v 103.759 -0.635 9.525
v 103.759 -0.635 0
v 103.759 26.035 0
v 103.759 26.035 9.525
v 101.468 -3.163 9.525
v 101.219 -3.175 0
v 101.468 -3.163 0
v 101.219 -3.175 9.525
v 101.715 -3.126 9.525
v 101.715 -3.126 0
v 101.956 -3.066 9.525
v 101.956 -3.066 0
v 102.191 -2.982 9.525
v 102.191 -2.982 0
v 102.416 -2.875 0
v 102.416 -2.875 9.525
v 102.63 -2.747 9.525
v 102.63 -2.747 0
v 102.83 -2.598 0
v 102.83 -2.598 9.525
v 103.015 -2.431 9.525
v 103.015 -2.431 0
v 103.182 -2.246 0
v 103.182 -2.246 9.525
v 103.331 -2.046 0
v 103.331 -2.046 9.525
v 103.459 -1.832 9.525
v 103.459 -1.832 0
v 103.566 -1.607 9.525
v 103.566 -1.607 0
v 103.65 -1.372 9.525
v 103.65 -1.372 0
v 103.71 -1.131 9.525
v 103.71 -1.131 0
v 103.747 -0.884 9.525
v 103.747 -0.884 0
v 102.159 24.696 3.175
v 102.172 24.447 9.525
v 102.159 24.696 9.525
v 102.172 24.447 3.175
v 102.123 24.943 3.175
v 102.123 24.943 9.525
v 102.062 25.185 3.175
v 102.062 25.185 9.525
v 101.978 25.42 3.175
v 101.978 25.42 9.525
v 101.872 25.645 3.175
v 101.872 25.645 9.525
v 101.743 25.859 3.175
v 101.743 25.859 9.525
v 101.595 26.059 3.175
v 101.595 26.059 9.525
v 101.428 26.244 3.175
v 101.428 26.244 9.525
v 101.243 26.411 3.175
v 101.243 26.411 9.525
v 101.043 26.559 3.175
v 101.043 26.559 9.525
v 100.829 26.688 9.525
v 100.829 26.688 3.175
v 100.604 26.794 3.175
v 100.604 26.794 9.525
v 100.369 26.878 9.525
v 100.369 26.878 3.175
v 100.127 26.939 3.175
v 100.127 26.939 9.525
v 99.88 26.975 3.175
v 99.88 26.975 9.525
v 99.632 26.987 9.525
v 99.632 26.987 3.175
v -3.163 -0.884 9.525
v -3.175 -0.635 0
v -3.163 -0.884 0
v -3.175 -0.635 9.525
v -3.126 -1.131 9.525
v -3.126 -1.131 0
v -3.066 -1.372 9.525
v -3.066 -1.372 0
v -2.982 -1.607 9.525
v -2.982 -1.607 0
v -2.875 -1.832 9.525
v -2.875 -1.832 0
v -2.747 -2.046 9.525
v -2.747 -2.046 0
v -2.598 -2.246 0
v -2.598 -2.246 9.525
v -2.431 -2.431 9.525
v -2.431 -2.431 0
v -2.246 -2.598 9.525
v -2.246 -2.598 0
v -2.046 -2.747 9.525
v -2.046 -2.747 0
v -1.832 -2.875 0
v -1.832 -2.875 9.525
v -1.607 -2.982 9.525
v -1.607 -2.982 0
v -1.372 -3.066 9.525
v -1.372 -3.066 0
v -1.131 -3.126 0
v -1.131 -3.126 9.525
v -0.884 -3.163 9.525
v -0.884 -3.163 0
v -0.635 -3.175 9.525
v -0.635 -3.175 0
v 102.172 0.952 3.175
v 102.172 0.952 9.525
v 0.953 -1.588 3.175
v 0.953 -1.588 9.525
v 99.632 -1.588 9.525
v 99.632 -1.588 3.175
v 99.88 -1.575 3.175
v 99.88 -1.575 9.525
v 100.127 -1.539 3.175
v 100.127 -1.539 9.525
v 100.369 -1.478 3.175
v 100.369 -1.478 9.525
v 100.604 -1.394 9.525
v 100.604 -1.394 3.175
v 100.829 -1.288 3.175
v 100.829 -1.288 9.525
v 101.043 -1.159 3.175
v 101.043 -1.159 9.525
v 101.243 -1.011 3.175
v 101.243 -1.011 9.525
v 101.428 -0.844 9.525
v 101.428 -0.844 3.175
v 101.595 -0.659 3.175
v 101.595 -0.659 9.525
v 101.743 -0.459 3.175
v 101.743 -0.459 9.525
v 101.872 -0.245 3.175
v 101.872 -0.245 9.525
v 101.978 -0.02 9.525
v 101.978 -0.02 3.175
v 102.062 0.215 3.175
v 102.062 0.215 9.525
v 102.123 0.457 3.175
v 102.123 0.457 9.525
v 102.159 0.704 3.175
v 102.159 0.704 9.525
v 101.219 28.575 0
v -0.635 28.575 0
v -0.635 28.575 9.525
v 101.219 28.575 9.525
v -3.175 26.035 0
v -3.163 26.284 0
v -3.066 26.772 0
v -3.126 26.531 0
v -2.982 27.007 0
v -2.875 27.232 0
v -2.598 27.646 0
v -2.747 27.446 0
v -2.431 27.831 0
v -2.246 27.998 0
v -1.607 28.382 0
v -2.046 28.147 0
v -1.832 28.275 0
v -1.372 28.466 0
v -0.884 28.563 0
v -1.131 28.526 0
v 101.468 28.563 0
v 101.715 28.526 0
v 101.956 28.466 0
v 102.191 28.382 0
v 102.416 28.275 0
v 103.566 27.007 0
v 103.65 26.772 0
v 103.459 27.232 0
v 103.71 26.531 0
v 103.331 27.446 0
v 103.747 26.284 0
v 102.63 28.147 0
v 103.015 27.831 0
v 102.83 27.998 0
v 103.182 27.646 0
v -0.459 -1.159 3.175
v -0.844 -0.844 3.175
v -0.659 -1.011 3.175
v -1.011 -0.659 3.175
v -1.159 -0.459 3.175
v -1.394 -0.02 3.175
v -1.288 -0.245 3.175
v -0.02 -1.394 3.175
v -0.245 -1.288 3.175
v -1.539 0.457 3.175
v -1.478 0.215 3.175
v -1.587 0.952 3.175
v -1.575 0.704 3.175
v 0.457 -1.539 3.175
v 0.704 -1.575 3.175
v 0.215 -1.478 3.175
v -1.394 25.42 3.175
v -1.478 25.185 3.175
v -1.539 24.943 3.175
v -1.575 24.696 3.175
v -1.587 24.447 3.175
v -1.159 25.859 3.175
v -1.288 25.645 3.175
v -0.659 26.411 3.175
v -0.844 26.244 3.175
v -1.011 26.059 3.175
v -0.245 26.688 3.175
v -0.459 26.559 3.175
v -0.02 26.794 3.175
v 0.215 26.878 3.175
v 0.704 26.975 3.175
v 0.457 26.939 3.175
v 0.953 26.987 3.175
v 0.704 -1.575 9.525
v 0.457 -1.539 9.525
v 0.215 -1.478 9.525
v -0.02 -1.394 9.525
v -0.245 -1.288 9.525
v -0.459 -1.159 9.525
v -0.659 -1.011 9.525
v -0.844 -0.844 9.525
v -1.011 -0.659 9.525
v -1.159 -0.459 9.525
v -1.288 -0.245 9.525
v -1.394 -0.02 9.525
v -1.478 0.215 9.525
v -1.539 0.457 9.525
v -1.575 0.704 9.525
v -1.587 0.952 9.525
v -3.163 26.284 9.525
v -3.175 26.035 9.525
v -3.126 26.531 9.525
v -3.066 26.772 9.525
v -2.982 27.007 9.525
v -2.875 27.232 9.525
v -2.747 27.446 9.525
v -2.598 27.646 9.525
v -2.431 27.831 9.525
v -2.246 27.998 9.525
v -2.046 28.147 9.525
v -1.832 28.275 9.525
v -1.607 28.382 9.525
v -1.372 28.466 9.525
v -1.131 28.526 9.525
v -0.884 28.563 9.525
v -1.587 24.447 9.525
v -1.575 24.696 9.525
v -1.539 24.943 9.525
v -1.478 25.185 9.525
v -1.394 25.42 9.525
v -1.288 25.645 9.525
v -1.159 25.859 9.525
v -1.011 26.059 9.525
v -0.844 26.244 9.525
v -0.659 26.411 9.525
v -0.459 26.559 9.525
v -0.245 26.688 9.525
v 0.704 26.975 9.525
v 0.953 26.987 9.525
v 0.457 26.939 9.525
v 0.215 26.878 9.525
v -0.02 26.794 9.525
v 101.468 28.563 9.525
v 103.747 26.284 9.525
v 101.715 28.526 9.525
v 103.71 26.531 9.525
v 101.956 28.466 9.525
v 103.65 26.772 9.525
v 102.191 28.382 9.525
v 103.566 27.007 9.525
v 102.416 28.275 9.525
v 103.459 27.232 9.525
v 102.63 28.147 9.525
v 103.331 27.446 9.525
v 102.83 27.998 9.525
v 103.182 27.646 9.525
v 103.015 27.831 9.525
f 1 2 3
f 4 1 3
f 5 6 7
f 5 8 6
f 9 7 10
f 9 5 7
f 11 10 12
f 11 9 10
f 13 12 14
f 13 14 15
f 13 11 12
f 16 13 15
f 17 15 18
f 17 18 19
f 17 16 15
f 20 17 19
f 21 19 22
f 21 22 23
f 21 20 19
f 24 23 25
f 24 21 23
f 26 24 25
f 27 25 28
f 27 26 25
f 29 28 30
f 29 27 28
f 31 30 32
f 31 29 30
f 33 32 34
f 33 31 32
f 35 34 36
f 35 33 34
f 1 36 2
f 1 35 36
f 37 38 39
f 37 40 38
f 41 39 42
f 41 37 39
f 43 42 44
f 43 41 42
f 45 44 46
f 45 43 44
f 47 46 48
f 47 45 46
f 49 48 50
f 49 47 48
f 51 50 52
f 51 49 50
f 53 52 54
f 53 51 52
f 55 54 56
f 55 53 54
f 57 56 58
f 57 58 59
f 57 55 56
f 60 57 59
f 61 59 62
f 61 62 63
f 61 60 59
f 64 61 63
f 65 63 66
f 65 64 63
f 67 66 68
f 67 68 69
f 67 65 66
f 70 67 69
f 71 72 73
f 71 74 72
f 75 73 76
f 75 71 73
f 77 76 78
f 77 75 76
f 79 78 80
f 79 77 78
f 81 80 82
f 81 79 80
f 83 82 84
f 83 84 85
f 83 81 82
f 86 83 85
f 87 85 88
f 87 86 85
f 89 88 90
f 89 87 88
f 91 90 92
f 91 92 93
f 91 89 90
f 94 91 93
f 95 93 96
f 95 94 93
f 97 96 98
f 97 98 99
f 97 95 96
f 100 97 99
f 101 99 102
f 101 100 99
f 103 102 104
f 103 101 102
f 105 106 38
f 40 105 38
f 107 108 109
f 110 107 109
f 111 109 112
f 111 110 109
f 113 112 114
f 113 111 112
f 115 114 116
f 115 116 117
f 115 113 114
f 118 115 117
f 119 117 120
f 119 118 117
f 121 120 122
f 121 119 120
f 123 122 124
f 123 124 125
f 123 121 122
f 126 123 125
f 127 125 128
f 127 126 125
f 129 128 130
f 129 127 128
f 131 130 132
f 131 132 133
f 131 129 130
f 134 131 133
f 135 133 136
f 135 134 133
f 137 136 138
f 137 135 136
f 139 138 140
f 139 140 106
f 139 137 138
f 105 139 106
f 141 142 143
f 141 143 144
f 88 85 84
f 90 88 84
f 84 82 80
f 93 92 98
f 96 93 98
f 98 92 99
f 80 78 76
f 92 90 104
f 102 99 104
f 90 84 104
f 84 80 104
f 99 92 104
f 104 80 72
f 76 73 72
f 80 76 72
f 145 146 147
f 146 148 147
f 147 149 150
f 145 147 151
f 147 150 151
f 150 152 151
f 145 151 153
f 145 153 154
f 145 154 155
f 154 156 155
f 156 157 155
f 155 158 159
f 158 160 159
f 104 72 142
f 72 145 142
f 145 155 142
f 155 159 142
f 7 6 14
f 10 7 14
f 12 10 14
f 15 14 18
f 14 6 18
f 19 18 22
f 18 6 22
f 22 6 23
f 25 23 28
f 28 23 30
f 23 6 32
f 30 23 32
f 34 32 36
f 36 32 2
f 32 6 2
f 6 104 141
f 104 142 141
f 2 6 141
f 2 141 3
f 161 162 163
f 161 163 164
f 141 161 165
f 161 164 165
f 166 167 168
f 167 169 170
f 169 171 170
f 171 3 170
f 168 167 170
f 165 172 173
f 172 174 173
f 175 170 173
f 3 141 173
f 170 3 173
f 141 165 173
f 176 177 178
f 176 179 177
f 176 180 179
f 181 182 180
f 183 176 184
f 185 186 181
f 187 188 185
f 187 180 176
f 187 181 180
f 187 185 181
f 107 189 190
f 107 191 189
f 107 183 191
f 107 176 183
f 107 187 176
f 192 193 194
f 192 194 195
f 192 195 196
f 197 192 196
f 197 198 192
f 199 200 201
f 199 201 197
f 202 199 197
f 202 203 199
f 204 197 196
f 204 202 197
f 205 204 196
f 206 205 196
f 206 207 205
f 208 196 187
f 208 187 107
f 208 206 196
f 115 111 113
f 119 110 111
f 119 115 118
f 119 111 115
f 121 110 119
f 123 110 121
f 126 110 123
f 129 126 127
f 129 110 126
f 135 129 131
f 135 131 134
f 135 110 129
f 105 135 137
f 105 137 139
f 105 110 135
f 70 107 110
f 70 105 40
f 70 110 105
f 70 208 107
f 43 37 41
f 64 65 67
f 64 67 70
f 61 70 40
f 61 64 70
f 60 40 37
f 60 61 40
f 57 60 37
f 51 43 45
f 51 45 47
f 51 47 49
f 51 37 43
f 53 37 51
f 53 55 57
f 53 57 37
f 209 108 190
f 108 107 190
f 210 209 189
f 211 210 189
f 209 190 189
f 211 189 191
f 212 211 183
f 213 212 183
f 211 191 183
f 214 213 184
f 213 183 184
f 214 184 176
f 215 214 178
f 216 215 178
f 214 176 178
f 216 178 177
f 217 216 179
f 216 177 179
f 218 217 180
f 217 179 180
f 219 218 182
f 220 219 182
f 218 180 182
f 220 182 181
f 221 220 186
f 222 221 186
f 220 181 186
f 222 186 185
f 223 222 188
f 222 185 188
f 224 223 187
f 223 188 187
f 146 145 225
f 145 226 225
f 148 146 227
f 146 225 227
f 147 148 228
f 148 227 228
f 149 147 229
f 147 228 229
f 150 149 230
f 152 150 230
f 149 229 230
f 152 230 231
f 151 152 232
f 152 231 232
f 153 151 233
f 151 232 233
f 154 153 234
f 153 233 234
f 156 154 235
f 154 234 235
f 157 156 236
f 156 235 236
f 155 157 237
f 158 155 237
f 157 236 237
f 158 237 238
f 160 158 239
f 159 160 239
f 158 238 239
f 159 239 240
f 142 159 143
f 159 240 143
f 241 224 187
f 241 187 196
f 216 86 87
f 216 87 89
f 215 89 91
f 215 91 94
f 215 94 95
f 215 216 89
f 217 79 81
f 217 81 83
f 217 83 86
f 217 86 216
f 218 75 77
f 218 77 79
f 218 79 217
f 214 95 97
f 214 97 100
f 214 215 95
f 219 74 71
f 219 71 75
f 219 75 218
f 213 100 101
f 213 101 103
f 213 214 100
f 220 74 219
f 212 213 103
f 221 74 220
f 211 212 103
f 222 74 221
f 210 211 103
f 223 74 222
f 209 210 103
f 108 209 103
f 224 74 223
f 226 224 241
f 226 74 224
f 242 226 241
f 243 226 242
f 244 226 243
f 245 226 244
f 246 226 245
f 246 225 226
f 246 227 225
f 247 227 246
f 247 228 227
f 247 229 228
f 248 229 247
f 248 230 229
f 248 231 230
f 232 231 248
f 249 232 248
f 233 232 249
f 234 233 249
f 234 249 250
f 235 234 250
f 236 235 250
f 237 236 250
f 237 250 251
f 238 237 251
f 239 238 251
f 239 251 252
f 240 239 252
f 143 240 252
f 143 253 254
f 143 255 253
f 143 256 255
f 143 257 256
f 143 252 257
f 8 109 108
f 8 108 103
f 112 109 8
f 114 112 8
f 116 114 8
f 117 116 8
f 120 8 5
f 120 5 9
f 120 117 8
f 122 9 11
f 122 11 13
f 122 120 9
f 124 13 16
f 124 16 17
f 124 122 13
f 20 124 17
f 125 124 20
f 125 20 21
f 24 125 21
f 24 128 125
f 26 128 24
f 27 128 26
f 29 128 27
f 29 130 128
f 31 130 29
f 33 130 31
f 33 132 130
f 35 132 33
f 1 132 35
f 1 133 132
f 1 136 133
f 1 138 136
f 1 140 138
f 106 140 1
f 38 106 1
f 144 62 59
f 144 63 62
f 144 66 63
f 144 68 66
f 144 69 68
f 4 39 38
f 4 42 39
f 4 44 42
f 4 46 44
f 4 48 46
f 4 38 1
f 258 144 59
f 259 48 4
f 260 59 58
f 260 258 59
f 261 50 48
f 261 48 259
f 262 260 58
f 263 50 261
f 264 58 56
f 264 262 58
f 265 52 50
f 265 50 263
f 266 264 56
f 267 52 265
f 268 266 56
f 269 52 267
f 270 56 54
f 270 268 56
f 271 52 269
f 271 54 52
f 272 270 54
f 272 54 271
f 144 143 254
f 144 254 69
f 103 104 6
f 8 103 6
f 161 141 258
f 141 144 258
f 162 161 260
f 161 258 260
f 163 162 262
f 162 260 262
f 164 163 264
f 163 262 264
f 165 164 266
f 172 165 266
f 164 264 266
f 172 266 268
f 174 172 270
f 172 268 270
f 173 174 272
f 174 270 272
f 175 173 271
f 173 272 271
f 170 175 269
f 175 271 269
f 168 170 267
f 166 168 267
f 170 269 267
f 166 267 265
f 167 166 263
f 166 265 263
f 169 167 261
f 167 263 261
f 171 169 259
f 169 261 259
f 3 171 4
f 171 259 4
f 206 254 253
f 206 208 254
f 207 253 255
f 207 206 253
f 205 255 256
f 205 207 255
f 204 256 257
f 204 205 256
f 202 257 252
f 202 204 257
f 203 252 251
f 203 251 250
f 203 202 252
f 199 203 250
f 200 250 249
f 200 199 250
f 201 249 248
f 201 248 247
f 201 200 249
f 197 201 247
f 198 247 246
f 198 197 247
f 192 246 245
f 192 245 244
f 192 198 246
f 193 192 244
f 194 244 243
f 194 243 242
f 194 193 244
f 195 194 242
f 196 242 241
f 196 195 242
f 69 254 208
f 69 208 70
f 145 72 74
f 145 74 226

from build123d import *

# Parameters (mm, degrees)
F0_W     = 100.584
F0_H     = 25.4
F1_DEPTH = 3.175
F0_W_2   = 106.934
F0_H_2   = 31.75
F2_DEPTH = 9.525
F3_W     = 103.759
F3_H     = 28.575
F3_W_2   = 100.584
F3_H_2   = 25.4
F4_DEPTH = 6.35
F5_R     = 2.54


with BuildPart() as f1:
    # F0 (on Top) → F1 (new body)
    with BuildSketch(Plane.XY):
        with Locations((50.292, 12.7)):
            Rectangle(F0_W, F0_H)
    extrude(amount=F1_DEPTH)

    # F0 (on Top) → F2 (join)
    with BuildSketch(Plane.XY):
        with Locations((50.292, 12.7)):
            Rectangle(F0_W_2, F0_H_2)
        with Locations((50.292, 12.7)):
            Rectangle(F0_W, F0_H, mode=Mode.SUBTRACT)
    extrude(amount=F2_DEPTH)

    # F3 (on face) → F4 (cut)
    with BuildSketch(Plane.XY.offset(9.525)):
        with Locations((50.292, 12.7)):
            Rectangle(F3_W, F3_H)
        with Locations((50.292, 12.7)):
            Rectangle(F3_W_2, F3_H_2, mode=Mode.SUBTRACT)
    extrude(amount=-F4_DEPTH, mode=Mode.SUBTRACT)

    # F5
    f5_edges = [f1.edges().sort_by_distance(p)[0] for p in [
        (-1.5875, 26.9875, 6.35),
        (-1.5875, -1.5875, 6.35),
        (102.1715, -1.5875, 6.35),
        (102.1715, 26.9875, 6.35),
        (-3.175, -3.175, 4.7625),
        (103.759, -3.175, 4.7625),
        (103.759, 28.575, 4.7625),
        (-3.175, 28.575, 4.7625),
    ]]
    fillet(f5_edges, radius=F5_R)


solid = f1.part
